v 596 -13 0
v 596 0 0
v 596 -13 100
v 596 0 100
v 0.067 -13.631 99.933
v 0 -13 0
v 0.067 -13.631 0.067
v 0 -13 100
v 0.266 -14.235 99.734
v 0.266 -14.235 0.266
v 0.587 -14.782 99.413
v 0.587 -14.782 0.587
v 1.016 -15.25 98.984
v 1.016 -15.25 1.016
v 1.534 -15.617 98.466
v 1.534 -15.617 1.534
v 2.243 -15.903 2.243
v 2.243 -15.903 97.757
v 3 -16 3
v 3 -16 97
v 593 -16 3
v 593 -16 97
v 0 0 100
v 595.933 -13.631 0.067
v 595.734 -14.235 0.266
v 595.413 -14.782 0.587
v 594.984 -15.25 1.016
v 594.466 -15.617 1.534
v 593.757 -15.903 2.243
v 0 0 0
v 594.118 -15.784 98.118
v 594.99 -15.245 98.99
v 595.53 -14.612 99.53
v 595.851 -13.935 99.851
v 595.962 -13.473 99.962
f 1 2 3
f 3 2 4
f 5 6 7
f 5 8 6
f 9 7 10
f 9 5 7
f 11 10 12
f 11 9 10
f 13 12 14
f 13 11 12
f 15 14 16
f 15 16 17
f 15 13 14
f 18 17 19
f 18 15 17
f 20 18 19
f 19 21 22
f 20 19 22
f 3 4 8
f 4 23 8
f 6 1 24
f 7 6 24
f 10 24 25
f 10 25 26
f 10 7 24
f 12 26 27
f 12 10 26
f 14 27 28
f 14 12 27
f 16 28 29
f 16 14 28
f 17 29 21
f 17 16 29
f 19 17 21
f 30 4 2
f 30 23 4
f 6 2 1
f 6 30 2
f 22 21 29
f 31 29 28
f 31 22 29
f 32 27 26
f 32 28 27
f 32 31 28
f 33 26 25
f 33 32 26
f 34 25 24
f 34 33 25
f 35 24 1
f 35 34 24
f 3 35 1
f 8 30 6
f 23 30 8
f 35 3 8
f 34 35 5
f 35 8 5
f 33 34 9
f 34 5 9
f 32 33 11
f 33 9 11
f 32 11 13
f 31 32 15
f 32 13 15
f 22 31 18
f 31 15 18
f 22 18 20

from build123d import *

# Parameters (mm, degrees)
F0_W     = 53.6684691906
F0_H     = 36.3845862448
F1_DEPTH = 16
F2_DEPTH = 396
F3_DEPTH = 100
F4_DEPTH = 200
F5_R     = 3


with BuildPart() as f1:
    # F0 (on Front) → F1 (new body)
    with BuildSketch(Plane.XZ):
        with Locations((26.8342345953, 18.1922931224)):
            Rectangle(F0_W, F0_H)
    extrude(amount=F1_DEPTH)

    # F2 (add): a face of the model
    f2_faces = [f1.faces().sort_by_distance(p)[0] for p in [
        (0, -8, 18.1922931224),
    ]]
    extrude(f2_faces, amount=-F2_DEPTH)

    # F3 (add): a face of the model
    f3_faces = [f1.faces().sort_by_distance(p)[0] for p in [
        (198, -8, 0),
    ]]
    extrude(f3_faces, amount=-F3_DEPTH)

    # F4 (add): a face of the model
    f4_faces = [f1.faces().sort_by_distance(p)[0] for p in [
        (396, -8, 50),
    ]]
    extrude(f4_faces, amount=F4_DEPTH)

    # F5
    f5_edges = [f1.edges().sort_by_distance(p)[0] for p in [
        (0, -16, 50),
        (298, -16, 0),
        (596, -16, 50),
        (298, -16, 100),
    ]]
    fillet(f5_edges, radius=F5_R)


solid = f1.part
